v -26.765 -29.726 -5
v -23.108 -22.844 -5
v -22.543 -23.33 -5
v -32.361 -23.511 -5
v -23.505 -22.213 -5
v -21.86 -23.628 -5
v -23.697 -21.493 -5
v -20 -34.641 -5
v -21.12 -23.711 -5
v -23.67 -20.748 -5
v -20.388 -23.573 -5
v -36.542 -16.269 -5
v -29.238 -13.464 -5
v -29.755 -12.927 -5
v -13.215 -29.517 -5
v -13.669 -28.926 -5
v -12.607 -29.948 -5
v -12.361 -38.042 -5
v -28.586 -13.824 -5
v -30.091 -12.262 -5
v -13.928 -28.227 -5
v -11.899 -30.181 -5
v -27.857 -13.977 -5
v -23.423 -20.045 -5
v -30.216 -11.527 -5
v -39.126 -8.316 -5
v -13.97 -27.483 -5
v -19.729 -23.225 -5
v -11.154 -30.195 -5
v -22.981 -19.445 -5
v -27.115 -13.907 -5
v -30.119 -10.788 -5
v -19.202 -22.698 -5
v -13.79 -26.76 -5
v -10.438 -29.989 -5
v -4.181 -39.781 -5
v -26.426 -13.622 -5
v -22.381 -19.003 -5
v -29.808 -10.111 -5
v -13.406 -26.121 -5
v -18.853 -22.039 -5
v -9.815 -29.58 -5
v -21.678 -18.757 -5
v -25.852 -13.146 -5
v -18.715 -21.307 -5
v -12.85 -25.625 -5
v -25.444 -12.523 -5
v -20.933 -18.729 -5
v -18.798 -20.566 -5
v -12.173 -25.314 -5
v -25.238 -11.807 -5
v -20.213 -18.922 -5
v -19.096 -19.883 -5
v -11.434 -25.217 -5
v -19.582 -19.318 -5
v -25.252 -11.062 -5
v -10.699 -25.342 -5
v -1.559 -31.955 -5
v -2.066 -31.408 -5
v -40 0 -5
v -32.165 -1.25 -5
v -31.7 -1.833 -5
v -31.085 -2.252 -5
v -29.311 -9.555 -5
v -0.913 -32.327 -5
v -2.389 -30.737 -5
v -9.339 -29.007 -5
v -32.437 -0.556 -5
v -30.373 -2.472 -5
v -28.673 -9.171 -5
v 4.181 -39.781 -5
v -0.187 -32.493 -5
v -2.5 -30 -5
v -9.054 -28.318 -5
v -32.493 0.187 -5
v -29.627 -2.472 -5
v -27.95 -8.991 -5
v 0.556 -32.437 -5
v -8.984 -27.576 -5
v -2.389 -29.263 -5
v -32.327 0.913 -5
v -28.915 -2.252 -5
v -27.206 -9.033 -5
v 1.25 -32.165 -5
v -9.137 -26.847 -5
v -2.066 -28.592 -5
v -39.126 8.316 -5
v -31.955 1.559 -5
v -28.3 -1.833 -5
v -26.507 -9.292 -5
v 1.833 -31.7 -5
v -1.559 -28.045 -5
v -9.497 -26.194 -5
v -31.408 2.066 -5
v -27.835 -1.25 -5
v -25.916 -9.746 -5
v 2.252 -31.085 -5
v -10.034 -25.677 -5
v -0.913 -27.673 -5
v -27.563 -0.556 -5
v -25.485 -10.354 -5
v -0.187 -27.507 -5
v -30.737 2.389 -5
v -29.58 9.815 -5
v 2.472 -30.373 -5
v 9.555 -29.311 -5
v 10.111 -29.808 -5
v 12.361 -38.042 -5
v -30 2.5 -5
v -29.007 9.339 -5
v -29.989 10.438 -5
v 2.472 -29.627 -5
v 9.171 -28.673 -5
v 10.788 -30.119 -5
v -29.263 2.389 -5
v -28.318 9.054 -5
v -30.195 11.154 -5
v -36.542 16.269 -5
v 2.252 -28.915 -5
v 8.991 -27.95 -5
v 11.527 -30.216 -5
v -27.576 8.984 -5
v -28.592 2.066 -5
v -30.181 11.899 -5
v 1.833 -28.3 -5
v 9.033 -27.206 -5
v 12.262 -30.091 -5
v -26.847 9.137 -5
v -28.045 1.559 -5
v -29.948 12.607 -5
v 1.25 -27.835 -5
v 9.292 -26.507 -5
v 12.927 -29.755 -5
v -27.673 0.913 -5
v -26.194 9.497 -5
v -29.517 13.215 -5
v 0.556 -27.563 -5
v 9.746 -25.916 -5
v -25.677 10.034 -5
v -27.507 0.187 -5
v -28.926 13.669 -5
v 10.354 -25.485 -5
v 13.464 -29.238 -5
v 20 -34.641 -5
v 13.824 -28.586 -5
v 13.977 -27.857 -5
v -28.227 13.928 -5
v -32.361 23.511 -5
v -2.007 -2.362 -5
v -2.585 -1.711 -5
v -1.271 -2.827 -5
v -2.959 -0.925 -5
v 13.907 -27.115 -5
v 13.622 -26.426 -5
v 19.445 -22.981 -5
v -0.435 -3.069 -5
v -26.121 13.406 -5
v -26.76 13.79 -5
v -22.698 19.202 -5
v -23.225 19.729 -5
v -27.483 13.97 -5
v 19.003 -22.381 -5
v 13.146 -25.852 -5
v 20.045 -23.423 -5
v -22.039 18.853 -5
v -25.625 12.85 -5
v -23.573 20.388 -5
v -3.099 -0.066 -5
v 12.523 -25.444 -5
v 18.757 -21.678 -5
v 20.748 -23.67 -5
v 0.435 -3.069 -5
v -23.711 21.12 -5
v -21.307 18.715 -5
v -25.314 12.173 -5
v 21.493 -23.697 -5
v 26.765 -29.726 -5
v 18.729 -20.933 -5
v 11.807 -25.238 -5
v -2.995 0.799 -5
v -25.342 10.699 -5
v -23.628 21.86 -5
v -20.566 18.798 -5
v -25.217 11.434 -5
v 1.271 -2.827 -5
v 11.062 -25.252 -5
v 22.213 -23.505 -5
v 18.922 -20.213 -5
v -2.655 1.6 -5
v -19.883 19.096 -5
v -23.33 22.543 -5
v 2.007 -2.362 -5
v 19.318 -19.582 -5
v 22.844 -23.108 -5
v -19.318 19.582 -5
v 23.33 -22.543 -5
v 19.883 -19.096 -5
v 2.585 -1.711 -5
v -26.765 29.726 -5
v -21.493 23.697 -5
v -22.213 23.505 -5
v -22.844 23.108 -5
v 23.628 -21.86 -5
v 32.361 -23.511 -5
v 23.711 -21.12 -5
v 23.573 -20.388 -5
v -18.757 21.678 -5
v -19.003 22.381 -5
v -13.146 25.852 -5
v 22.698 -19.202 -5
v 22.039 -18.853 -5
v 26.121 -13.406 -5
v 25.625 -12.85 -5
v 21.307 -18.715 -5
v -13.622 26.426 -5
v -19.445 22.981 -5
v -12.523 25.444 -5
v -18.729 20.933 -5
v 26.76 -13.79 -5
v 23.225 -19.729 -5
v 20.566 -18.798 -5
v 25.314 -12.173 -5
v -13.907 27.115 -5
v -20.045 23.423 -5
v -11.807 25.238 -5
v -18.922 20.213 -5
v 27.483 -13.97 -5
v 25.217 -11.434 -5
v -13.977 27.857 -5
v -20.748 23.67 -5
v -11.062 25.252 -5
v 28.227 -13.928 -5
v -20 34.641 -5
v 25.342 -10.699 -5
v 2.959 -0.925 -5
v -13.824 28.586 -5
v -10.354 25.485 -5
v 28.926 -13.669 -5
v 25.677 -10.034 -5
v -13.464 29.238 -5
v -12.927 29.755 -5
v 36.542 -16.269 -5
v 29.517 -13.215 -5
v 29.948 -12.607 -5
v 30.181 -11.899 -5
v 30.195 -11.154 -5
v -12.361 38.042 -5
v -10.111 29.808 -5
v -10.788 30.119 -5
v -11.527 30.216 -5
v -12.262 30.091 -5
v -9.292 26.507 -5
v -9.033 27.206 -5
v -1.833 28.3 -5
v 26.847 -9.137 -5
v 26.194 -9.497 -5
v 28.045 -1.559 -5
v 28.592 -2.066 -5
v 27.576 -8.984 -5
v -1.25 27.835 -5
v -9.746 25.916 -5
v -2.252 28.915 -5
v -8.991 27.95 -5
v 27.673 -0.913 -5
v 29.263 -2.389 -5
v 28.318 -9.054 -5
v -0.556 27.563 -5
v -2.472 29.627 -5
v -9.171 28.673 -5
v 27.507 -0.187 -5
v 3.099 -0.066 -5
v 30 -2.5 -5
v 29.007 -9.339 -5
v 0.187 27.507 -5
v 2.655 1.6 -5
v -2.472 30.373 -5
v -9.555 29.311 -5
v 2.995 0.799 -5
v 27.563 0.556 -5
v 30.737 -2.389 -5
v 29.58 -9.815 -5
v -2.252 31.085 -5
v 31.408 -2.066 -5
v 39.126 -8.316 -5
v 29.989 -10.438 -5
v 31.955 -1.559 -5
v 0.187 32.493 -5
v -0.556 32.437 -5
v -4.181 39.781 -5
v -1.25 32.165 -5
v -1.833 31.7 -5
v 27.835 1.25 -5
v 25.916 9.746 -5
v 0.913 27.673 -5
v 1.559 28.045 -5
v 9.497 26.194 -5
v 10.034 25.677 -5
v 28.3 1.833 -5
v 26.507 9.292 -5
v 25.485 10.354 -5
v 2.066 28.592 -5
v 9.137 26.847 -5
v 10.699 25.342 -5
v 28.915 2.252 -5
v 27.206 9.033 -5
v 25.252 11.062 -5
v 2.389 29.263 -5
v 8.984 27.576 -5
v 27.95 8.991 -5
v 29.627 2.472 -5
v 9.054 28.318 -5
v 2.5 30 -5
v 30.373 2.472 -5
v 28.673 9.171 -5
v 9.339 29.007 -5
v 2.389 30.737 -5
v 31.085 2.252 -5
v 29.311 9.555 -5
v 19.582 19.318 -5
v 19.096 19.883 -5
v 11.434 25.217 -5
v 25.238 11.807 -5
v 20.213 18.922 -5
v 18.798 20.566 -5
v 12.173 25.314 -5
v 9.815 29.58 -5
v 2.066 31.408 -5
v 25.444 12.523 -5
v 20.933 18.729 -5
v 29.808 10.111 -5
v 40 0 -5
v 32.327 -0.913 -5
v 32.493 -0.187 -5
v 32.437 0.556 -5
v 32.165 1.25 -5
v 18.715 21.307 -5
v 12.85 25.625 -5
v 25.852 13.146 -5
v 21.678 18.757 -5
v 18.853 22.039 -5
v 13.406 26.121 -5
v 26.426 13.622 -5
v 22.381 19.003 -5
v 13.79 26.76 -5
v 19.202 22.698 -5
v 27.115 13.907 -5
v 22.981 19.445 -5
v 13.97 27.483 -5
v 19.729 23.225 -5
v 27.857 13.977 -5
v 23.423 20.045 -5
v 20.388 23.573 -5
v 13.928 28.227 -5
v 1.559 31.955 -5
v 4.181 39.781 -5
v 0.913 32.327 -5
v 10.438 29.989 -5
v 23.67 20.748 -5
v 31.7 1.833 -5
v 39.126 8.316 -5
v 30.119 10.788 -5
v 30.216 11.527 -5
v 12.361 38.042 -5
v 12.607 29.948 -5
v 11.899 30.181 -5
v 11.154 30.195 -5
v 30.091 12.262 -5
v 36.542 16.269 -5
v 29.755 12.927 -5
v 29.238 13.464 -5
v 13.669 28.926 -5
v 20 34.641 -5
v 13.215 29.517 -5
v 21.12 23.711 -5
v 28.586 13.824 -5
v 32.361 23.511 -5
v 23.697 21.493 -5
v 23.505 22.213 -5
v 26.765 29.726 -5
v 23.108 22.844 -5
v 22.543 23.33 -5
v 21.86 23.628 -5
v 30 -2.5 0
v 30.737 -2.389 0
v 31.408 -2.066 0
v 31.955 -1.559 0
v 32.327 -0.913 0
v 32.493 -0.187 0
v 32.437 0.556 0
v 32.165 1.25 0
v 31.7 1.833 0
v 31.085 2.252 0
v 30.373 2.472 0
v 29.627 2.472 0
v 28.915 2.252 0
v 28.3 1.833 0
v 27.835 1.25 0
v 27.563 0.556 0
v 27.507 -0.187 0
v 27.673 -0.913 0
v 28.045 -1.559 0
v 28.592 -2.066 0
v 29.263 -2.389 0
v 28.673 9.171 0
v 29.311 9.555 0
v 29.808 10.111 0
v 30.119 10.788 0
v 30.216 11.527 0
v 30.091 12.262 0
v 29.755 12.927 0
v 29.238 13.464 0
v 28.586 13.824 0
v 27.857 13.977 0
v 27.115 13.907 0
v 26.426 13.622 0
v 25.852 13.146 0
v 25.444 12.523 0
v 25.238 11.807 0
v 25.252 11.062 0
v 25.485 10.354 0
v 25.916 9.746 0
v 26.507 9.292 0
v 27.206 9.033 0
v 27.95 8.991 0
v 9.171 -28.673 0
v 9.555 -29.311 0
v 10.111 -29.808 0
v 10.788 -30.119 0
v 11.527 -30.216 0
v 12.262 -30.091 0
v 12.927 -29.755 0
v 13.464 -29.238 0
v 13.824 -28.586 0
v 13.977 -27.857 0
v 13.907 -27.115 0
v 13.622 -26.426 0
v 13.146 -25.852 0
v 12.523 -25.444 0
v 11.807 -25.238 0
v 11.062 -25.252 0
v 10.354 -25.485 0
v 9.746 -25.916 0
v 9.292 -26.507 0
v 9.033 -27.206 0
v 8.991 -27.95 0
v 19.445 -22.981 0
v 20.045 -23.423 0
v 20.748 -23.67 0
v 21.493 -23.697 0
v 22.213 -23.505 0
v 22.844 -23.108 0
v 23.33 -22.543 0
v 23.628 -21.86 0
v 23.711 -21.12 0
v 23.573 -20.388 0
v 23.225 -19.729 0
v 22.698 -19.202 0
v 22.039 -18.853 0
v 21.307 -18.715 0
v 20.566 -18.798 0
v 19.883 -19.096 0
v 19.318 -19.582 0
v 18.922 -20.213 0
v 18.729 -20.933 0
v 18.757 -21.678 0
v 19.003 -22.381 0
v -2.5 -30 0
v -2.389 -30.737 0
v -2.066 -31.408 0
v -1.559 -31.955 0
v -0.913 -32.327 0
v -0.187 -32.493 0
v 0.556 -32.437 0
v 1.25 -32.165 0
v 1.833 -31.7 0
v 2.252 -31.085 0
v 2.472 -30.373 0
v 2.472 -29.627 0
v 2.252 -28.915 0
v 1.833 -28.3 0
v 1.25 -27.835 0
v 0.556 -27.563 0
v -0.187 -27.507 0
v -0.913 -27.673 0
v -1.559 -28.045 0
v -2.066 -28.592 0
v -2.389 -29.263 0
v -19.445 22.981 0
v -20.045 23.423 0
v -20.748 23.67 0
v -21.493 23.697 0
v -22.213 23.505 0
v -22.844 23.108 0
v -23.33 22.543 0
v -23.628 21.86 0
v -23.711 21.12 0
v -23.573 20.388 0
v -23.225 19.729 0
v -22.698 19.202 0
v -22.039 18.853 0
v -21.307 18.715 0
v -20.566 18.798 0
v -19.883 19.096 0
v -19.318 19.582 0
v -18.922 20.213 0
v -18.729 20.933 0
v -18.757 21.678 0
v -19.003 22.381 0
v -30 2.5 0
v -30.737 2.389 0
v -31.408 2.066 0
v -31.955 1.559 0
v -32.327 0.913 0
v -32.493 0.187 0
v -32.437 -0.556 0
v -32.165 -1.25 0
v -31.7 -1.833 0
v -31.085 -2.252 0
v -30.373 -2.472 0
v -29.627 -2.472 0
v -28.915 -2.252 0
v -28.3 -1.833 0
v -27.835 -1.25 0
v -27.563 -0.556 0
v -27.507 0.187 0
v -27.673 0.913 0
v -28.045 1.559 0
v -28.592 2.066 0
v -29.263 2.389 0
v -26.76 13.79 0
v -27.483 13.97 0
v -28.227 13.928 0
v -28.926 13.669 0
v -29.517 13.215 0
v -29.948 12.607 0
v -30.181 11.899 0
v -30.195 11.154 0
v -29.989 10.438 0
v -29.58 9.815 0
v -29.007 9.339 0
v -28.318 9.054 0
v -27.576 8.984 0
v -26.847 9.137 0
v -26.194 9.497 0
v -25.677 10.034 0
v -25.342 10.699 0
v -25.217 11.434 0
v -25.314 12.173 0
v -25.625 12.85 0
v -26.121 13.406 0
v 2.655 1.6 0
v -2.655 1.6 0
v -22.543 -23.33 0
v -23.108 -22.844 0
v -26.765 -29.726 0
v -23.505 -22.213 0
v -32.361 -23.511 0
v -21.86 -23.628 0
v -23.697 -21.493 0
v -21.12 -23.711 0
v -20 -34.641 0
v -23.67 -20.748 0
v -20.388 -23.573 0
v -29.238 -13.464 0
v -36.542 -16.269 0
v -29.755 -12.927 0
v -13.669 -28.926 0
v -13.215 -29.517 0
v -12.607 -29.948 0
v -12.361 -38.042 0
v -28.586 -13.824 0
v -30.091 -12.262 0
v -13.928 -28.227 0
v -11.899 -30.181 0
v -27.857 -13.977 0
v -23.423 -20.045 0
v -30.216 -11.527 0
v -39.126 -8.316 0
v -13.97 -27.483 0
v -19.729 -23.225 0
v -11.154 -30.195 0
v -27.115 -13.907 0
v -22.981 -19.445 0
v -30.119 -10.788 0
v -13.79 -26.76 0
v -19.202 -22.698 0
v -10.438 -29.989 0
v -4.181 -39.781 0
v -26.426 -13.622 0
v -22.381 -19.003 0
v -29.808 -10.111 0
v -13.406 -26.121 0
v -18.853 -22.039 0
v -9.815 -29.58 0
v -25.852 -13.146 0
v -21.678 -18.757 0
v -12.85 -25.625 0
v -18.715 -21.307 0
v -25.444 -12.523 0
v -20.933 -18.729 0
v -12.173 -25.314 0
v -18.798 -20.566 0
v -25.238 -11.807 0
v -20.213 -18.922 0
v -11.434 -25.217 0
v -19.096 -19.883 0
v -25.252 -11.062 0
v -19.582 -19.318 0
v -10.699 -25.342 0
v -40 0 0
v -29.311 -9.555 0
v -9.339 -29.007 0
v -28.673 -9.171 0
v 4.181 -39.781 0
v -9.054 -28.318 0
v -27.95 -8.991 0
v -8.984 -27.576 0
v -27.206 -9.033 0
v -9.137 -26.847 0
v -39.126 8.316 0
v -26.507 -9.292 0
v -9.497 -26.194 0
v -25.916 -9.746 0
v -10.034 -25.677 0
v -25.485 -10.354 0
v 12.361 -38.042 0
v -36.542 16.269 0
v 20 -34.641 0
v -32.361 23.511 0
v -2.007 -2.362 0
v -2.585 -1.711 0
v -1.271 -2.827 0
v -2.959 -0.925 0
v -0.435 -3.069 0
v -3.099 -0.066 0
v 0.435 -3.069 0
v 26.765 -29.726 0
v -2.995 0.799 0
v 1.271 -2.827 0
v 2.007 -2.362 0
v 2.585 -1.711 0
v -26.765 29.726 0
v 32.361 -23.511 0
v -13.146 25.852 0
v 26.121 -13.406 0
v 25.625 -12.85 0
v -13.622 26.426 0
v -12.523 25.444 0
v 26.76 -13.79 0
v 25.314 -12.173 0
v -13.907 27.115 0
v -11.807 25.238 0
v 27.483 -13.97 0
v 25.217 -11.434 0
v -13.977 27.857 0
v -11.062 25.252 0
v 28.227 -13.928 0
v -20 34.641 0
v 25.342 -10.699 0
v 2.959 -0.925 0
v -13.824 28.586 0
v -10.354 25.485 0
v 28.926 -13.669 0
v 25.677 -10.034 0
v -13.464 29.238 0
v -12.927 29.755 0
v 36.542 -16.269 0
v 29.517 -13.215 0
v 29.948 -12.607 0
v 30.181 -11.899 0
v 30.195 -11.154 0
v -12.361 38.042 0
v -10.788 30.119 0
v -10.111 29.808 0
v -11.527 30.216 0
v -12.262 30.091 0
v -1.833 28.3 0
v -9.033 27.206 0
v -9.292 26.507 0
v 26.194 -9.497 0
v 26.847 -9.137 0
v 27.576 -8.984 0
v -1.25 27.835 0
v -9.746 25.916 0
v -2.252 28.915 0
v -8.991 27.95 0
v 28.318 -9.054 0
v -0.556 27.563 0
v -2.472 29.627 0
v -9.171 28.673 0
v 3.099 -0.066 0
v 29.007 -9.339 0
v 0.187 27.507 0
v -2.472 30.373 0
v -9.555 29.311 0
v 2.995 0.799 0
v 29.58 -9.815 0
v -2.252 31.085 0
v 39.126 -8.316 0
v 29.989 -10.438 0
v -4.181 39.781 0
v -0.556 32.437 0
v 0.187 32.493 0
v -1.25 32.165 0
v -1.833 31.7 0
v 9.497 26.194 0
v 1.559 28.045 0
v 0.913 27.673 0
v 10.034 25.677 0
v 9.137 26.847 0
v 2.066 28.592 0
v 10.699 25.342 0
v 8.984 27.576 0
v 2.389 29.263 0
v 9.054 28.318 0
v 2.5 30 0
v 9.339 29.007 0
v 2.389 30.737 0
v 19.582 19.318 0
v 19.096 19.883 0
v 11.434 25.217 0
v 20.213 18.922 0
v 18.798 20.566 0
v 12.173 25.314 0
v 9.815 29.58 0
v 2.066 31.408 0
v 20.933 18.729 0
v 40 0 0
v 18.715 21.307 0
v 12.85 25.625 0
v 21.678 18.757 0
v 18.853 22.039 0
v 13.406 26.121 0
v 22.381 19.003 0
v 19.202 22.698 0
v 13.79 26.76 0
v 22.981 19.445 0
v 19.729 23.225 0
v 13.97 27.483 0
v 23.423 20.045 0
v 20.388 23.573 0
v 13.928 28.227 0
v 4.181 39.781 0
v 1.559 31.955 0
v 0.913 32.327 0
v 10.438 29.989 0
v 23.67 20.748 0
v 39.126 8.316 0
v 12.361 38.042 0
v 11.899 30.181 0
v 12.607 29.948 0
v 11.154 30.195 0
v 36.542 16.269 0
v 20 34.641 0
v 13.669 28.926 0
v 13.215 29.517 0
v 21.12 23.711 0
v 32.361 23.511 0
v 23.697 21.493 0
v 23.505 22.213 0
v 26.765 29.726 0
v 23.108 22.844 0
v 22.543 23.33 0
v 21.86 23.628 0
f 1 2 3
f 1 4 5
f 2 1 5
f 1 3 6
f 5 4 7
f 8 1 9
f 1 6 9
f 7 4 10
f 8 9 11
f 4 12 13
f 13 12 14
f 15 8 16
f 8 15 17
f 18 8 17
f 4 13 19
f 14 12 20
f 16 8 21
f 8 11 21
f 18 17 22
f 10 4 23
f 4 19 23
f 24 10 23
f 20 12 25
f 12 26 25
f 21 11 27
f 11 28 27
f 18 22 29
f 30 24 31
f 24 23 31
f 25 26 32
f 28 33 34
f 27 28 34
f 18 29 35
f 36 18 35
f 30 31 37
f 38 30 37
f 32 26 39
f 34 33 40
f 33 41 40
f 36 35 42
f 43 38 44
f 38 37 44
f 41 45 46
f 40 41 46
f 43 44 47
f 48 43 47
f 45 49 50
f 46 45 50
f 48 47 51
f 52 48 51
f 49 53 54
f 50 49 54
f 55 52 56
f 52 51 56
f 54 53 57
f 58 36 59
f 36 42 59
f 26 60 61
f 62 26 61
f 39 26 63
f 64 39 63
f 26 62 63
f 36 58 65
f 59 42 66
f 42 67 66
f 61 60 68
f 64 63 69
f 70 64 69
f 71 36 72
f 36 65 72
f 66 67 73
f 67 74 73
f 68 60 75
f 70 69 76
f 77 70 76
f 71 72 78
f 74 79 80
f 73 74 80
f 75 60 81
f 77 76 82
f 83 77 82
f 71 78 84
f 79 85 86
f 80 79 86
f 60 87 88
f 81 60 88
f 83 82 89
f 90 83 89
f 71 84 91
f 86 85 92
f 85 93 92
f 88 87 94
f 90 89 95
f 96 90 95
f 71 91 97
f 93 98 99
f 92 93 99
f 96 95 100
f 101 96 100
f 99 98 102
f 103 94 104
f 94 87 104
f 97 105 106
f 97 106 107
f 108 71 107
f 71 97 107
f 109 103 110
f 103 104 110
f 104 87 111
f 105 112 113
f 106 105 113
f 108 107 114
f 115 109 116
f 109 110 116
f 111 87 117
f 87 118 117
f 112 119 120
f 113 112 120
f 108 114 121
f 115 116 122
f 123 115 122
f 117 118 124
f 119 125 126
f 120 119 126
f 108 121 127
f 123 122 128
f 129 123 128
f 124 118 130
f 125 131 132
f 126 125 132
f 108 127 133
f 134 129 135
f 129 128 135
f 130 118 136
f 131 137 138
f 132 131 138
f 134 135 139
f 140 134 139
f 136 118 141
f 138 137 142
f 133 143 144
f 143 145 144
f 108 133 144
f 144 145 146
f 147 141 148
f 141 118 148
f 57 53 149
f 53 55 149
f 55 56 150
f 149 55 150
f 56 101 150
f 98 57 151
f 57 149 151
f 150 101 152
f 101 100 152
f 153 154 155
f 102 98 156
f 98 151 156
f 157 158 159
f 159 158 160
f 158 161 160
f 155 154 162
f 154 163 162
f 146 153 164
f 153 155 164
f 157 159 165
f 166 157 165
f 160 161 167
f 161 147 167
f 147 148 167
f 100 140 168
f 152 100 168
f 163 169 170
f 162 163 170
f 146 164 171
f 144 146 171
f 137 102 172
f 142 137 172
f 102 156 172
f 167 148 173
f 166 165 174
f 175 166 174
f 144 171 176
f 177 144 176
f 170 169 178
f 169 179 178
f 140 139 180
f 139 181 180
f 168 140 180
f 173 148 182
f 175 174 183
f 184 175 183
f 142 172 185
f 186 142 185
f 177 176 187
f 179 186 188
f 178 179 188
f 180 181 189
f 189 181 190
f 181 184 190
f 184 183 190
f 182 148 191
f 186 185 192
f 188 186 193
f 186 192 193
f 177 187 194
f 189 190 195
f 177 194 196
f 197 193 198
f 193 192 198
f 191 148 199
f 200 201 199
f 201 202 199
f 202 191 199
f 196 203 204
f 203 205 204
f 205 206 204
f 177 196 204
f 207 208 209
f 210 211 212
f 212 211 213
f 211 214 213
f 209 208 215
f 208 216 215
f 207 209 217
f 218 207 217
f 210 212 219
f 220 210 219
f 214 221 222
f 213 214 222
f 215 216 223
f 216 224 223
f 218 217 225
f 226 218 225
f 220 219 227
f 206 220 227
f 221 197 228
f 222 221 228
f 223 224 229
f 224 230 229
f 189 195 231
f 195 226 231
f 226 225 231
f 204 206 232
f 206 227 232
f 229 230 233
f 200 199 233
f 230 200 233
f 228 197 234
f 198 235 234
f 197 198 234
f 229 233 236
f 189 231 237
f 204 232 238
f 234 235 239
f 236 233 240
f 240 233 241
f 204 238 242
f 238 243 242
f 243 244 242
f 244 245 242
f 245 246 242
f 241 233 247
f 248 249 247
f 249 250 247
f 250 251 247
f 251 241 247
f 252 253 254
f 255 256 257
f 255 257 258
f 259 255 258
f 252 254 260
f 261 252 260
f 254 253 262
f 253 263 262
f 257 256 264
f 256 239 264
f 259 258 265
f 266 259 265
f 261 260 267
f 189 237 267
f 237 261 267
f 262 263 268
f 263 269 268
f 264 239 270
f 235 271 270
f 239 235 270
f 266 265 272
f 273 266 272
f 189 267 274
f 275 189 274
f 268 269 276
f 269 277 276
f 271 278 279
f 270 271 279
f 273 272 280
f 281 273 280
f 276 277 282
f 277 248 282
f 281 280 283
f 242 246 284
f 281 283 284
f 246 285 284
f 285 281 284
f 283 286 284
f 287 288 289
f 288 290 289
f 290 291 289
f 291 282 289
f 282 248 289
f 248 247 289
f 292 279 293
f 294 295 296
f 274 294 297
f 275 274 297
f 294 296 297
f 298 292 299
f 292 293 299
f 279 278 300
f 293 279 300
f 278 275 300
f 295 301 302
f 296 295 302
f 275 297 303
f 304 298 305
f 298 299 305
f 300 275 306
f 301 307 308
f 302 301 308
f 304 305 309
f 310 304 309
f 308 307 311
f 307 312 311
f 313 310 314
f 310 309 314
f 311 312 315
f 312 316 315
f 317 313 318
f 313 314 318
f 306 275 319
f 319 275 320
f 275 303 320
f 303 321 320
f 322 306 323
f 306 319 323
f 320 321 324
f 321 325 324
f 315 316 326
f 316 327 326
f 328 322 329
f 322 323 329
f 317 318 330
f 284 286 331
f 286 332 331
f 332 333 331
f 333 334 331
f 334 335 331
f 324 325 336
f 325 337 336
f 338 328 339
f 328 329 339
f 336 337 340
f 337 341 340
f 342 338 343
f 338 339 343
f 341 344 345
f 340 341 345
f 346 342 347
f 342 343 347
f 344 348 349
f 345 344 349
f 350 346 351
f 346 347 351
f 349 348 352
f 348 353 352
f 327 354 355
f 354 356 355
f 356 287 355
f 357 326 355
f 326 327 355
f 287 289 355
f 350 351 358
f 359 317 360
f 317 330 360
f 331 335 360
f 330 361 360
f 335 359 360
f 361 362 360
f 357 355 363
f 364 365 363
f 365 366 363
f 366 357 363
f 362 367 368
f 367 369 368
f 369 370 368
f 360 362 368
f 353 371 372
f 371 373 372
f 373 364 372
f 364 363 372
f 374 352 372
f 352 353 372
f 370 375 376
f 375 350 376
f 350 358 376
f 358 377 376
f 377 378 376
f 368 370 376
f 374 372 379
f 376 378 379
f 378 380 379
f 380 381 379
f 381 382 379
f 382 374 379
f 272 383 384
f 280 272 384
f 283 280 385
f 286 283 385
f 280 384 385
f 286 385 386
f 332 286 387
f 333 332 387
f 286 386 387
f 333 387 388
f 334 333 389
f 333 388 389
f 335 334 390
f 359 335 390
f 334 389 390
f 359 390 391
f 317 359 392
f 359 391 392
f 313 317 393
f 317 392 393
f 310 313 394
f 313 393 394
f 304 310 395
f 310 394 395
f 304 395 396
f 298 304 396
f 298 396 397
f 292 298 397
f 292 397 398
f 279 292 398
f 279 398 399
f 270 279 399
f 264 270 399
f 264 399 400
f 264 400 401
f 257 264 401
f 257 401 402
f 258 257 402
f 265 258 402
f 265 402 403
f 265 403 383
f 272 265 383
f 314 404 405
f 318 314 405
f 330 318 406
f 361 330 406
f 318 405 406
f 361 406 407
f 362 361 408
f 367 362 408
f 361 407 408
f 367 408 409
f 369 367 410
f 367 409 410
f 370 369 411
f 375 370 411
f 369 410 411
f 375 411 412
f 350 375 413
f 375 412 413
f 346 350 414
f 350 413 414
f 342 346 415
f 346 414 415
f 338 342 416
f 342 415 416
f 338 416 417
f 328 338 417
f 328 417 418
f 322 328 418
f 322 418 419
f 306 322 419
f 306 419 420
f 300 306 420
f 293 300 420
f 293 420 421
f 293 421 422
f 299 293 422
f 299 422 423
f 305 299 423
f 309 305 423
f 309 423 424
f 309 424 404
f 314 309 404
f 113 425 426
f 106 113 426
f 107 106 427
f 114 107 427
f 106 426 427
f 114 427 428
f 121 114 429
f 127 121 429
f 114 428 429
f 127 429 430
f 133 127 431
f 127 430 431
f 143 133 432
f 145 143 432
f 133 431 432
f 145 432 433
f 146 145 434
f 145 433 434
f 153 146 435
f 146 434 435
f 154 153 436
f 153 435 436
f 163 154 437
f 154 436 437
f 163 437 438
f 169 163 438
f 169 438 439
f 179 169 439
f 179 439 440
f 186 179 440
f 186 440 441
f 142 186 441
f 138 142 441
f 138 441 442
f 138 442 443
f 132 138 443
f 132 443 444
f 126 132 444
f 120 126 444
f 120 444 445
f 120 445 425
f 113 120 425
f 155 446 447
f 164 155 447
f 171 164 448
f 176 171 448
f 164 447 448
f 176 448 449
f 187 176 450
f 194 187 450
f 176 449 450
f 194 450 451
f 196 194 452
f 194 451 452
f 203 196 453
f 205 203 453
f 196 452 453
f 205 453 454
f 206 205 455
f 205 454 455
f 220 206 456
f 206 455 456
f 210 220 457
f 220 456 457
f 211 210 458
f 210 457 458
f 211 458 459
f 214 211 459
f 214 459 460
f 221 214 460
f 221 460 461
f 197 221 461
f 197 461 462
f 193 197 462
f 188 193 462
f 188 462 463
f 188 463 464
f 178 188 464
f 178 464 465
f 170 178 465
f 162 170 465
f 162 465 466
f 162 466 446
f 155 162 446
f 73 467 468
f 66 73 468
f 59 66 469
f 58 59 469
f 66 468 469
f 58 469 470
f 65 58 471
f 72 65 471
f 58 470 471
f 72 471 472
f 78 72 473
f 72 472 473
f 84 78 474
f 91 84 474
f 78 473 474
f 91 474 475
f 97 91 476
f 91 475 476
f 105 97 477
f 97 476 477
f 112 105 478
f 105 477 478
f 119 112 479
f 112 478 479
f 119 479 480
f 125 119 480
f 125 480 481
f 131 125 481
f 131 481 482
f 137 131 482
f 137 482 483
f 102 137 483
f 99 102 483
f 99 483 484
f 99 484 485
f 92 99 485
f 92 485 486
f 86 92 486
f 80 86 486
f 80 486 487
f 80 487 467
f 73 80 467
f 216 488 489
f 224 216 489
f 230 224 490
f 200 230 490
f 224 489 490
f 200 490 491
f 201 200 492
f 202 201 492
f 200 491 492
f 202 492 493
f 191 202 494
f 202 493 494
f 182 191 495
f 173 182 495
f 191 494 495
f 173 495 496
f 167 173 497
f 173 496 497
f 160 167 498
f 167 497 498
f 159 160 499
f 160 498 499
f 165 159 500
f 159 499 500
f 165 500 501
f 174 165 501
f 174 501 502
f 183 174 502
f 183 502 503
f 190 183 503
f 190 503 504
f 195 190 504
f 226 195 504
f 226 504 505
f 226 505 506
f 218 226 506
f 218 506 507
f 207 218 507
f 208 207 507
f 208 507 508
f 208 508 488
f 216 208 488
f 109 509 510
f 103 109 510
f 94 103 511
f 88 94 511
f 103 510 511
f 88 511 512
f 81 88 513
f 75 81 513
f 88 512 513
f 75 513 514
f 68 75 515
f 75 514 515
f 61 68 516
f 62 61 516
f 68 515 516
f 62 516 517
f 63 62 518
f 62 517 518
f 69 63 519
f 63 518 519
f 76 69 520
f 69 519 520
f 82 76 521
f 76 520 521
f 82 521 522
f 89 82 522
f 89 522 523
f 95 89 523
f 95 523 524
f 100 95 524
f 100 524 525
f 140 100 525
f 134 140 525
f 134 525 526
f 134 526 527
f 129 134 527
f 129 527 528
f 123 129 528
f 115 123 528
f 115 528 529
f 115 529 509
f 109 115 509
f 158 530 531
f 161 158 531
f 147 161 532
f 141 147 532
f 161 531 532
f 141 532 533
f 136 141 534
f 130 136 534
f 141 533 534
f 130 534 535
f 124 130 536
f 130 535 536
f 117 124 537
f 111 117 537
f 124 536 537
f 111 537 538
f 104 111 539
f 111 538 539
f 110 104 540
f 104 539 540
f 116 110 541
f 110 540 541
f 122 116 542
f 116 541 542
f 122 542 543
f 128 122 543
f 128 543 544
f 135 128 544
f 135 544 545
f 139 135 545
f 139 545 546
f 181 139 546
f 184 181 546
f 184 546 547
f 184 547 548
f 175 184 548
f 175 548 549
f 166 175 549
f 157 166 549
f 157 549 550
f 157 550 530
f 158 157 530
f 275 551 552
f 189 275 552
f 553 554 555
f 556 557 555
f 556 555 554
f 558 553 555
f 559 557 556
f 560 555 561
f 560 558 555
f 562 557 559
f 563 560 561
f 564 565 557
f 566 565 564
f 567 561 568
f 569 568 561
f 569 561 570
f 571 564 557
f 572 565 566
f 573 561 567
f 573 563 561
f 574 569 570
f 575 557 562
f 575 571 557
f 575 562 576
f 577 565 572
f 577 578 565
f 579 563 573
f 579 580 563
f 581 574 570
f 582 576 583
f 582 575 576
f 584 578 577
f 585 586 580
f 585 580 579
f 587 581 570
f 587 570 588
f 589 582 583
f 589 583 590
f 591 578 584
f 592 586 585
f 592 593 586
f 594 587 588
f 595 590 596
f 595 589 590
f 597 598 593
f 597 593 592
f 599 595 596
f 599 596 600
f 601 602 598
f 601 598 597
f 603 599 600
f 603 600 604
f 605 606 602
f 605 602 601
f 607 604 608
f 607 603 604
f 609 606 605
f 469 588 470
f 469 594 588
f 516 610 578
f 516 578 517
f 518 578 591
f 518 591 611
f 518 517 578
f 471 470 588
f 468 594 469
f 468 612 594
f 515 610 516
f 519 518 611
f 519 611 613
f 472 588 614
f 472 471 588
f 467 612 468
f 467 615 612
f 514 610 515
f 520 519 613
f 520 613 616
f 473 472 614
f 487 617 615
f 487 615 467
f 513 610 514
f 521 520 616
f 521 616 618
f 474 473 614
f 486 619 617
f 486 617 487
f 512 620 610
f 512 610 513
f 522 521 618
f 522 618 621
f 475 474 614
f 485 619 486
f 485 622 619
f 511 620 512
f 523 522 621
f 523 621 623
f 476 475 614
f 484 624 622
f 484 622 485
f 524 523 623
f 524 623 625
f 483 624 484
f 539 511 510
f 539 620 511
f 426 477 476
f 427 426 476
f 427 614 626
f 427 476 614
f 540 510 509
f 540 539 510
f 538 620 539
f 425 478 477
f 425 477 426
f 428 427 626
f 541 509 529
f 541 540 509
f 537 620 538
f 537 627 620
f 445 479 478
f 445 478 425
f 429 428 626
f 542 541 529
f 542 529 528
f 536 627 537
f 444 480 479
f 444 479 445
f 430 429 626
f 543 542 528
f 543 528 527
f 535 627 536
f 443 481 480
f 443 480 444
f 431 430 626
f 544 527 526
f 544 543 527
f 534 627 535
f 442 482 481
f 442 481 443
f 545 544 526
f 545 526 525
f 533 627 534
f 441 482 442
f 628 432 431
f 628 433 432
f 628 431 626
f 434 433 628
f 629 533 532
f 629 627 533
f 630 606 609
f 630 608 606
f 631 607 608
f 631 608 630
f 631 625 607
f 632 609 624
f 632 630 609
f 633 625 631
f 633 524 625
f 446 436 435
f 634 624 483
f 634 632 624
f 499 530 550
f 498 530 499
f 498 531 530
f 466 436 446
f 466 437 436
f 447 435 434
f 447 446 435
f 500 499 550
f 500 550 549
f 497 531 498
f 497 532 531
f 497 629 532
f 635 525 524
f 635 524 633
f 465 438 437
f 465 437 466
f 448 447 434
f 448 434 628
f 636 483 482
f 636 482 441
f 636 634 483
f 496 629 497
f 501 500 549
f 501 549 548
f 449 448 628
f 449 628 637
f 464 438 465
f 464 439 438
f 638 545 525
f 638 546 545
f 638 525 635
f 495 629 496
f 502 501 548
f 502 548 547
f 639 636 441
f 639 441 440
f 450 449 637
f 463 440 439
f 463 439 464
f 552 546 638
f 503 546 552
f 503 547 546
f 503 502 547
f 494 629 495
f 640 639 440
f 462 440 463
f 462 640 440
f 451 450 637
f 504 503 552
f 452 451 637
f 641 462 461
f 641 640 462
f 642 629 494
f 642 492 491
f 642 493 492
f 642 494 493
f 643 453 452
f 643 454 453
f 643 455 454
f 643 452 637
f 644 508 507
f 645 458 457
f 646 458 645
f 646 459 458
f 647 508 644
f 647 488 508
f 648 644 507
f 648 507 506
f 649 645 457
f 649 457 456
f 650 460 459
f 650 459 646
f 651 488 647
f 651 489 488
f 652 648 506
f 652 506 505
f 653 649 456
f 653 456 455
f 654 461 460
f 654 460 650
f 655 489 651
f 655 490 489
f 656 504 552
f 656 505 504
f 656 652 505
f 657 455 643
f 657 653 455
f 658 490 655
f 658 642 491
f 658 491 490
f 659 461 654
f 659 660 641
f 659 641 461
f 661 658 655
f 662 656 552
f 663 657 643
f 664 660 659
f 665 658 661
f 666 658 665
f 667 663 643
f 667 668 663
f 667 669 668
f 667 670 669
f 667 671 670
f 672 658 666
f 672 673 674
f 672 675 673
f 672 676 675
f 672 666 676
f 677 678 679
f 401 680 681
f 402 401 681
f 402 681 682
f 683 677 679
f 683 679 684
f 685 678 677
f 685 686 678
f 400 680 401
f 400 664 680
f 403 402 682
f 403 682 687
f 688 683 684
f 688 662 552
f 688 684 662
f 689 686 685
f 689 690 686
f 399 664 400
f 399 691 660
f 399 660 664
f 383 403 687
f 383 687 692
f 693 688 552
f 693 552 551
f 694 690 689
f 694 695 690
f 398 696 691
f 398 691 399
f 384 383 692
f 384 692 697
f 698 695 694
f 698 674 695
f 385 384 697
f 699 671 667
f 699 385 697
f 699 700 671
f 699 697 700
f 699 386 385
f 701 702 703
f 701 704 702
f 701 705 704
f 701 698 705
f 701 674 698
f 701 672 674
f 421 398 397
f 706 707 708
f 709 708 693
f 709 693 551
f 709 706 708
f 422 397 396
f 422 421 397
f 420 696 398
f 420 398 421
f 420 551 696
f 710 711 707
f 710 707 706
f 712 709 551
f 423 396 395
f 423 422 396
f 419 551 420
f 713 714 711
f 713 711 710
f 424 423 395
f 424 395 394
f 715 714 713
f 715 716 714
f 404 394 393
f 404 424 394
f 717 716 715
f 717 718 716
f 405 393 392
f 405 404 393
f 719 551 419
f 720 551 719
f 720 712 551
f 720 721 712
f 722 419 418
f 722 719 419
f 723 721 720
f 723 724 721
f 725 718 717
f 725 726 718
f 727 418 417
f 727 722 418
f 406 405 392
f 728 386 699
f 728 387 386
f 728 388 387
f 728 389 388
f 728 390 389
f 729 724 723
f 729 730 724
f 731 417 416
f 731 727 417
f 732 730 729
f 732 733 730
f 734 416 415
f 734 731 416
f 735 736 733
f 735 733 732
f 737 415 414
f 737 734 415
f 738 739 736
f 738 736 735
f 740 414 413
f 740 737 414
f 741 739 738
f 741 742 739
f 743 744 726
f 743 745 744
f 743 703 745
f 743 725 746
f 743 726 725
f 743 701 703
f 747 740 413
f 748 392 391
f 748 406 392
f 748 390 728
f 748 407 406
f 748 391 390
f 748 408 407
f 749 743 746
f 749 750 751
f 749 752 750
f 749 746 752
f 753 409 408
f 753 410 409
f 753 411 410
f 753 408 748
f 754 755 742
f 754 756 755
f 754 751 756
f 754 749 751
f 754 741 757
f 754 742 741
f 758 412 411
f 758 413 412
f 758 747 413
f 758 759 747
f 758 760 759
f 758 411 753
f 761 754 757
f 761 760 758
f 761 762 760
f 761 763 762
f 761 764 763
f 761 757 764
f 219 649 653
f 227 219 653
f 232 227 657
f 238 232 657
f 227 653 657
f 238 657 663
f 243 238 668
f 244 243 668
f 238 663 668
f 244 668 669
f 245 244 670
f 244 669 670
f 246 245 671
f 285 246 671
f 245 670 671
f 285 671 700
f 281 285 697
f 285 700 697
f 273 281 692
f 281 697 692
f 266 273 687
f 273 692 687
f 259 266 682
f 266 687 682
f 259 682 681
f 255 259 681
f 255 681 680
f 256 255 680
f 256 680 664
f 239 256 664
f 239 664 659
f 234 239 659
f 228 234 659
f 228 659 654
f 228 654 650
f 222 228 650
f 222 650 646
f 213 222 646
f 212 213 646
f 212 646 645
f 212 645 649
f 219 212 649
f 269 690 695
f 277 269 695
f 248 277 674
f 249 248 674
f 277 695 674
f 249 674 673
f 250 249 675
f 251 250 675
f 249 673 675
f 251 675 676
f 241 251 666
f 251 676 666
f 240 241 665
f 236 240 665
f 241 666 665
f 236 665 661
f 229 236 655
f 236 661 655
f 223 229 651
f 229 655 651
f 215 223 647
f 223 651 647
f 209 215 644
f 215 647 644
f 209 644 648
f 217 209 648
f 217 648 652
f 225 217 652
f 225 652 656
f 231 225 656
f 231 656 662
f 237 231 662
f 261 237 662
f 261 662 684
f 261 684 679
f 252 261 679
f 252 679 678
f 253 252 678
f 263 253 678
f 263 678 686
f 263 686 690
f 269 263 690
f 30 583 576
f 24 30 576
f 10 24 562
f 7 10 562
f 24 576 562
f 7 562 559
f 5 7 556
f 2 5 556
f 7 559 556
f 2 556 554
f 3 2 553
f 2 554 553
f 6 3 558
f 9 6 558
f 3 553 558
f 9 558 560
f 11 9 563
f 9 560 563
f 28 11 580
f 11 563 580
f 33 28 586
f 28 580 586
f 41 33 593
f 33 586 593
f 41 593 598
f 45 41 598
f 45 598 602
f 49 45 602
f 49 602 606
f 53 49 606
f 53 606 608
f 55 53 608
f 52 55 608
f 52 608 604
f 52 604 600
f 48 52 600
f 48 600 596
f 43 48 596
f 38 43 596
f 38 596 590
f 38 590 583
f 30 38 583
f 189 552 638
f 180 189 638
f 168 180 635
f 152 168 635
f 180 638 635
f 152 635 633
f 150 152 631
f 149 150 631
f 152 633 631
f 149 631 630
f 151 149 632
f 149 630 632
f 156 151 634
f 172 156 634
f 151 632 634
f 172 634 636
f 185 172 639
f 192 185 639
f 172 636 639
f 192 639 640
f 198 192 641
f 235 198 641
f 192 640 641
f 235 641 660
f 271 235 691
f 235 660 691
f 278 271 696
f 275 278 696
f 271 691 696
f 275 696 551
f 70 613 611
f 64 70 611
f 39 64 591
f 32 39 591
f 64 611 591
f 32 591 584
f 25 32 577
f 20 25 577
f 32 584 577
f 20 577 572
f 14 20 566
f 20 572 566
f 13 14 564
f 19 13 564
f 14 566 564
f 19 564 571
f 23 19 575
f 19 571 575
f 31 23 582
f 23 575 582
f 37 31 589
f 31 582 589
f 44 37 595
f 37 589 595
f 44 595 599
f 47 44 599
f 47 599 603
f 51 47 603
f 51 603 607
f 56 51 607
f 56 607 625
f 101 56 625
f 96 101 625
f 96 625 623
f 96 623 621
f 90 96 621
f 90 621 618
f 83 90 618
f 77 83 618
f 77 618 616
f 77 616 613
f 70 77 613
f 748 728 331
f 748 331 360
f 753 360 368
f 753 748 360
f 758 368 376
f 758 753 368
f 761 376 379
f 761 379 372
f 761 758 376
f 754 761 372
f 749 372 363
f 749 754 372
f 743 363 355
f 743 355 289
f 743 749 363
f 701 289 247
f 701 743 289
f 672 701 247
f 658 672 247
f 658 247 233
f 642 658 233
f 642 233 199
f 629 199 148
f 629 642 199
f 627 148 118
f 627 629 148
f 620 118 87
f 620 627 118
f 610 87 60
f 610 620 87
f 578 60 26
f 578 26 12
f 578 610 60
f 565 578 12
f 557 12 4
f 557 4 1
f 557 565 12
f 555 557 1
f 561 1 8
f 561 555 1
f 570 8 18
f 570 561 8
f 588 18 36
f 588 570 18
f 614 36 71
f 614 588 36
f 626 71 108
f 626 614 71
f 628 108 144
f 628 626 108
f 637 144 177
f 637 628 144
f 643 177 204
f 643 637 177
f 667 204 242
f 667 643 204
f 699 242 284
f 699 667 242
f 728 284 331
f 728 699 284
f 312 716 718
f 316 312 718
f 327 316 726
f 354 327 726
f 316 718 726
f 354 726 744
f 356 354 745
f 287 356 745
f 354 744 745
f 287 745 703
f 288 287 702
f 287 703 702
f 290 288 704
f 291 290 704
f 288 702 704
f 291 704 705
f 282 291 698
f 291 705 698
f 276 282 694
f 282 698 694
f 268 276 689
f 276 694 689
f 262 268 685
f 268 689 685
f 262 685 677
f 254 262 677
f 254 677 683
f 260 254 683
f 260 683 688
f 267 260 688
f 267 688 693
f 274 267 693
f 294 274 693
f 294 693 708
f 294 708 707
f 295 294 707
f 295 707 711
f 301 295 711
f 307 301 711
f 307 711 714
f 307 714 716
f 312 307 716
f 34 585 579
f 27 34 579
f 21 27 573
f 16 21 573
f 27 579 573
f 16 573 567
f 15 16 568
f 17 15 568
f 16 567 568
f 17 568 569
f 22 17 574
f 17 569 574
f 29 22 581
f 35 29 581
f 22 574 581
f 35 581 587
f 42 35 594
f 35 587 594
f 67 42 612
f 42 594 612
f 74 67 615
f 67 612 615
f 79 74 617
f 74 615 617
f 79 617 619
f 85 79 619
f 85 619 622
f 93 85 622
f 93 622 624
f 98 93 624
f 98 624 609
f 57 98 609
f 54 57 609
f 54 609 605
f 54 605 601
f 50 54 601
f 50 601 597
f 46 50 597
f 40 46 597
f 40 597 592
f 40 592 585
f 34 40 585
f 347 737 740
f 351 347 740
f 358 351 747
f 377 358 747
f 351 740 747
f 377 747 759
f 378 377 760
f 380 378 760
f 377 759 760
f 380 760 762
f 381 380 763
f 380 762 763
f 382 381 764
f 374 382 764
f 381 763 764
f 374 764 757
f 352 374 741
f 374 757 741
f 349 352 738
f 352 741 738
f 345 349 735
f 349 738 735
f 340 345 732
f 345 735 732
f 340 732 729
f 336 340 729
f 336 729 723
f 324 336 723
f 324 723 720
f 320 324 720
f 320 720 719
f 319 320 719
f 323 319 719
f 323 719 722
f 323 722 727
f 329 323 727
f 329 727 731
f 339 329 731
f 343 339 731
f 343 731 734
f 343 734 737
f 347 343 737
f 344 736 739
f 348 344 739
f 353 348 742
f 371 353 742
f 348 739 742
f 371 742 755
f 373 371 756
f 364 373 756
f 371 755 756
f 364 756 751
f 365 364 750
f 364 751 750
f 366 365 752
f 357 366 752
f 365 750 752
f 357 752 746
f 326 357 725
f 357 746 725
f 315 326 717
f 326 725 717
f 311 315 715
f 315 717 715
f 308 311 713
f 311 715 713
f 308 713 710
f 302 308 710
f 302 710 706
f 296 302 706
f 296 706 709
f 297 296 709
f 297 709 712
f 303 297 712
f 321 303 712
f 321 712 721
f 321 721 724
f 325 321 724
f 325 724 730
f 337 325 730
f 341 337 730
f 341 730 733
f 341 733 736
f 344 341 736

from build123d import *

# Parameters (mm, degrees)
SKETCH1_R          = 40
BASE_FLANGE1_DEPTH = 5
CUT_EXTRUDE1_REACH = 58.789
SKETCH6_R          = 2.5
CIRPATTERN1_COUNT  = 16


# Sheet-metal steps are written as plain solids
with BuildPart() as part:
    # Sketch1 → Base-Flange1 (new body)
    with BuildSketch(Plane.XY):
        Circle(SKETCH1_R)
        with BuildLine():
            Line((2.655183609, 1.6), (-2.655183609, 1.6))
            ThreePointArc((-2.655183609, 1.6), (0, -3.1), (2.655183609, 1.6))
        make_face(mode=Mode.SUBTRACT)
    extrude(amount=-BASE_FLANGE1_DEPTH)

    # Sketch6 → Cut-Extrude1 (cut, up to next)
    with BuildSketch(Plane.XY, mode=Mode.PRIVATE) as cut_extrude1_sk1:
        with Locations((0, 30)):
            Circle(SKETCH6_R)
    cut_extrude1_tool1 = extrude(cut_extrude1_sk1.sketch, amount=-CUT_EXTRUDE1_REACH, mode=Mode.PRIVATE) & part.part
    cut_extrude1 = cut_extrude1_tool1.solids().sort_by_distance((0, 30, 0))[0]
    add(cut_extrude1, mode=Mode.SUBTRACT)

    # CirPattern1: Cut-Extrude1 ×16 about axis
    cirpattern1_axis = Axis((0, 0, 0), (0, 0, 1))
    for i in range(1, CIRPATTERN1_COUNT):
        add(cut_extrude1.rotate(cirpattern1_axis, i * 360 / CIRPATTERN1_COUNT), mode=Mode.SUBTRACT)


solid = part.part
